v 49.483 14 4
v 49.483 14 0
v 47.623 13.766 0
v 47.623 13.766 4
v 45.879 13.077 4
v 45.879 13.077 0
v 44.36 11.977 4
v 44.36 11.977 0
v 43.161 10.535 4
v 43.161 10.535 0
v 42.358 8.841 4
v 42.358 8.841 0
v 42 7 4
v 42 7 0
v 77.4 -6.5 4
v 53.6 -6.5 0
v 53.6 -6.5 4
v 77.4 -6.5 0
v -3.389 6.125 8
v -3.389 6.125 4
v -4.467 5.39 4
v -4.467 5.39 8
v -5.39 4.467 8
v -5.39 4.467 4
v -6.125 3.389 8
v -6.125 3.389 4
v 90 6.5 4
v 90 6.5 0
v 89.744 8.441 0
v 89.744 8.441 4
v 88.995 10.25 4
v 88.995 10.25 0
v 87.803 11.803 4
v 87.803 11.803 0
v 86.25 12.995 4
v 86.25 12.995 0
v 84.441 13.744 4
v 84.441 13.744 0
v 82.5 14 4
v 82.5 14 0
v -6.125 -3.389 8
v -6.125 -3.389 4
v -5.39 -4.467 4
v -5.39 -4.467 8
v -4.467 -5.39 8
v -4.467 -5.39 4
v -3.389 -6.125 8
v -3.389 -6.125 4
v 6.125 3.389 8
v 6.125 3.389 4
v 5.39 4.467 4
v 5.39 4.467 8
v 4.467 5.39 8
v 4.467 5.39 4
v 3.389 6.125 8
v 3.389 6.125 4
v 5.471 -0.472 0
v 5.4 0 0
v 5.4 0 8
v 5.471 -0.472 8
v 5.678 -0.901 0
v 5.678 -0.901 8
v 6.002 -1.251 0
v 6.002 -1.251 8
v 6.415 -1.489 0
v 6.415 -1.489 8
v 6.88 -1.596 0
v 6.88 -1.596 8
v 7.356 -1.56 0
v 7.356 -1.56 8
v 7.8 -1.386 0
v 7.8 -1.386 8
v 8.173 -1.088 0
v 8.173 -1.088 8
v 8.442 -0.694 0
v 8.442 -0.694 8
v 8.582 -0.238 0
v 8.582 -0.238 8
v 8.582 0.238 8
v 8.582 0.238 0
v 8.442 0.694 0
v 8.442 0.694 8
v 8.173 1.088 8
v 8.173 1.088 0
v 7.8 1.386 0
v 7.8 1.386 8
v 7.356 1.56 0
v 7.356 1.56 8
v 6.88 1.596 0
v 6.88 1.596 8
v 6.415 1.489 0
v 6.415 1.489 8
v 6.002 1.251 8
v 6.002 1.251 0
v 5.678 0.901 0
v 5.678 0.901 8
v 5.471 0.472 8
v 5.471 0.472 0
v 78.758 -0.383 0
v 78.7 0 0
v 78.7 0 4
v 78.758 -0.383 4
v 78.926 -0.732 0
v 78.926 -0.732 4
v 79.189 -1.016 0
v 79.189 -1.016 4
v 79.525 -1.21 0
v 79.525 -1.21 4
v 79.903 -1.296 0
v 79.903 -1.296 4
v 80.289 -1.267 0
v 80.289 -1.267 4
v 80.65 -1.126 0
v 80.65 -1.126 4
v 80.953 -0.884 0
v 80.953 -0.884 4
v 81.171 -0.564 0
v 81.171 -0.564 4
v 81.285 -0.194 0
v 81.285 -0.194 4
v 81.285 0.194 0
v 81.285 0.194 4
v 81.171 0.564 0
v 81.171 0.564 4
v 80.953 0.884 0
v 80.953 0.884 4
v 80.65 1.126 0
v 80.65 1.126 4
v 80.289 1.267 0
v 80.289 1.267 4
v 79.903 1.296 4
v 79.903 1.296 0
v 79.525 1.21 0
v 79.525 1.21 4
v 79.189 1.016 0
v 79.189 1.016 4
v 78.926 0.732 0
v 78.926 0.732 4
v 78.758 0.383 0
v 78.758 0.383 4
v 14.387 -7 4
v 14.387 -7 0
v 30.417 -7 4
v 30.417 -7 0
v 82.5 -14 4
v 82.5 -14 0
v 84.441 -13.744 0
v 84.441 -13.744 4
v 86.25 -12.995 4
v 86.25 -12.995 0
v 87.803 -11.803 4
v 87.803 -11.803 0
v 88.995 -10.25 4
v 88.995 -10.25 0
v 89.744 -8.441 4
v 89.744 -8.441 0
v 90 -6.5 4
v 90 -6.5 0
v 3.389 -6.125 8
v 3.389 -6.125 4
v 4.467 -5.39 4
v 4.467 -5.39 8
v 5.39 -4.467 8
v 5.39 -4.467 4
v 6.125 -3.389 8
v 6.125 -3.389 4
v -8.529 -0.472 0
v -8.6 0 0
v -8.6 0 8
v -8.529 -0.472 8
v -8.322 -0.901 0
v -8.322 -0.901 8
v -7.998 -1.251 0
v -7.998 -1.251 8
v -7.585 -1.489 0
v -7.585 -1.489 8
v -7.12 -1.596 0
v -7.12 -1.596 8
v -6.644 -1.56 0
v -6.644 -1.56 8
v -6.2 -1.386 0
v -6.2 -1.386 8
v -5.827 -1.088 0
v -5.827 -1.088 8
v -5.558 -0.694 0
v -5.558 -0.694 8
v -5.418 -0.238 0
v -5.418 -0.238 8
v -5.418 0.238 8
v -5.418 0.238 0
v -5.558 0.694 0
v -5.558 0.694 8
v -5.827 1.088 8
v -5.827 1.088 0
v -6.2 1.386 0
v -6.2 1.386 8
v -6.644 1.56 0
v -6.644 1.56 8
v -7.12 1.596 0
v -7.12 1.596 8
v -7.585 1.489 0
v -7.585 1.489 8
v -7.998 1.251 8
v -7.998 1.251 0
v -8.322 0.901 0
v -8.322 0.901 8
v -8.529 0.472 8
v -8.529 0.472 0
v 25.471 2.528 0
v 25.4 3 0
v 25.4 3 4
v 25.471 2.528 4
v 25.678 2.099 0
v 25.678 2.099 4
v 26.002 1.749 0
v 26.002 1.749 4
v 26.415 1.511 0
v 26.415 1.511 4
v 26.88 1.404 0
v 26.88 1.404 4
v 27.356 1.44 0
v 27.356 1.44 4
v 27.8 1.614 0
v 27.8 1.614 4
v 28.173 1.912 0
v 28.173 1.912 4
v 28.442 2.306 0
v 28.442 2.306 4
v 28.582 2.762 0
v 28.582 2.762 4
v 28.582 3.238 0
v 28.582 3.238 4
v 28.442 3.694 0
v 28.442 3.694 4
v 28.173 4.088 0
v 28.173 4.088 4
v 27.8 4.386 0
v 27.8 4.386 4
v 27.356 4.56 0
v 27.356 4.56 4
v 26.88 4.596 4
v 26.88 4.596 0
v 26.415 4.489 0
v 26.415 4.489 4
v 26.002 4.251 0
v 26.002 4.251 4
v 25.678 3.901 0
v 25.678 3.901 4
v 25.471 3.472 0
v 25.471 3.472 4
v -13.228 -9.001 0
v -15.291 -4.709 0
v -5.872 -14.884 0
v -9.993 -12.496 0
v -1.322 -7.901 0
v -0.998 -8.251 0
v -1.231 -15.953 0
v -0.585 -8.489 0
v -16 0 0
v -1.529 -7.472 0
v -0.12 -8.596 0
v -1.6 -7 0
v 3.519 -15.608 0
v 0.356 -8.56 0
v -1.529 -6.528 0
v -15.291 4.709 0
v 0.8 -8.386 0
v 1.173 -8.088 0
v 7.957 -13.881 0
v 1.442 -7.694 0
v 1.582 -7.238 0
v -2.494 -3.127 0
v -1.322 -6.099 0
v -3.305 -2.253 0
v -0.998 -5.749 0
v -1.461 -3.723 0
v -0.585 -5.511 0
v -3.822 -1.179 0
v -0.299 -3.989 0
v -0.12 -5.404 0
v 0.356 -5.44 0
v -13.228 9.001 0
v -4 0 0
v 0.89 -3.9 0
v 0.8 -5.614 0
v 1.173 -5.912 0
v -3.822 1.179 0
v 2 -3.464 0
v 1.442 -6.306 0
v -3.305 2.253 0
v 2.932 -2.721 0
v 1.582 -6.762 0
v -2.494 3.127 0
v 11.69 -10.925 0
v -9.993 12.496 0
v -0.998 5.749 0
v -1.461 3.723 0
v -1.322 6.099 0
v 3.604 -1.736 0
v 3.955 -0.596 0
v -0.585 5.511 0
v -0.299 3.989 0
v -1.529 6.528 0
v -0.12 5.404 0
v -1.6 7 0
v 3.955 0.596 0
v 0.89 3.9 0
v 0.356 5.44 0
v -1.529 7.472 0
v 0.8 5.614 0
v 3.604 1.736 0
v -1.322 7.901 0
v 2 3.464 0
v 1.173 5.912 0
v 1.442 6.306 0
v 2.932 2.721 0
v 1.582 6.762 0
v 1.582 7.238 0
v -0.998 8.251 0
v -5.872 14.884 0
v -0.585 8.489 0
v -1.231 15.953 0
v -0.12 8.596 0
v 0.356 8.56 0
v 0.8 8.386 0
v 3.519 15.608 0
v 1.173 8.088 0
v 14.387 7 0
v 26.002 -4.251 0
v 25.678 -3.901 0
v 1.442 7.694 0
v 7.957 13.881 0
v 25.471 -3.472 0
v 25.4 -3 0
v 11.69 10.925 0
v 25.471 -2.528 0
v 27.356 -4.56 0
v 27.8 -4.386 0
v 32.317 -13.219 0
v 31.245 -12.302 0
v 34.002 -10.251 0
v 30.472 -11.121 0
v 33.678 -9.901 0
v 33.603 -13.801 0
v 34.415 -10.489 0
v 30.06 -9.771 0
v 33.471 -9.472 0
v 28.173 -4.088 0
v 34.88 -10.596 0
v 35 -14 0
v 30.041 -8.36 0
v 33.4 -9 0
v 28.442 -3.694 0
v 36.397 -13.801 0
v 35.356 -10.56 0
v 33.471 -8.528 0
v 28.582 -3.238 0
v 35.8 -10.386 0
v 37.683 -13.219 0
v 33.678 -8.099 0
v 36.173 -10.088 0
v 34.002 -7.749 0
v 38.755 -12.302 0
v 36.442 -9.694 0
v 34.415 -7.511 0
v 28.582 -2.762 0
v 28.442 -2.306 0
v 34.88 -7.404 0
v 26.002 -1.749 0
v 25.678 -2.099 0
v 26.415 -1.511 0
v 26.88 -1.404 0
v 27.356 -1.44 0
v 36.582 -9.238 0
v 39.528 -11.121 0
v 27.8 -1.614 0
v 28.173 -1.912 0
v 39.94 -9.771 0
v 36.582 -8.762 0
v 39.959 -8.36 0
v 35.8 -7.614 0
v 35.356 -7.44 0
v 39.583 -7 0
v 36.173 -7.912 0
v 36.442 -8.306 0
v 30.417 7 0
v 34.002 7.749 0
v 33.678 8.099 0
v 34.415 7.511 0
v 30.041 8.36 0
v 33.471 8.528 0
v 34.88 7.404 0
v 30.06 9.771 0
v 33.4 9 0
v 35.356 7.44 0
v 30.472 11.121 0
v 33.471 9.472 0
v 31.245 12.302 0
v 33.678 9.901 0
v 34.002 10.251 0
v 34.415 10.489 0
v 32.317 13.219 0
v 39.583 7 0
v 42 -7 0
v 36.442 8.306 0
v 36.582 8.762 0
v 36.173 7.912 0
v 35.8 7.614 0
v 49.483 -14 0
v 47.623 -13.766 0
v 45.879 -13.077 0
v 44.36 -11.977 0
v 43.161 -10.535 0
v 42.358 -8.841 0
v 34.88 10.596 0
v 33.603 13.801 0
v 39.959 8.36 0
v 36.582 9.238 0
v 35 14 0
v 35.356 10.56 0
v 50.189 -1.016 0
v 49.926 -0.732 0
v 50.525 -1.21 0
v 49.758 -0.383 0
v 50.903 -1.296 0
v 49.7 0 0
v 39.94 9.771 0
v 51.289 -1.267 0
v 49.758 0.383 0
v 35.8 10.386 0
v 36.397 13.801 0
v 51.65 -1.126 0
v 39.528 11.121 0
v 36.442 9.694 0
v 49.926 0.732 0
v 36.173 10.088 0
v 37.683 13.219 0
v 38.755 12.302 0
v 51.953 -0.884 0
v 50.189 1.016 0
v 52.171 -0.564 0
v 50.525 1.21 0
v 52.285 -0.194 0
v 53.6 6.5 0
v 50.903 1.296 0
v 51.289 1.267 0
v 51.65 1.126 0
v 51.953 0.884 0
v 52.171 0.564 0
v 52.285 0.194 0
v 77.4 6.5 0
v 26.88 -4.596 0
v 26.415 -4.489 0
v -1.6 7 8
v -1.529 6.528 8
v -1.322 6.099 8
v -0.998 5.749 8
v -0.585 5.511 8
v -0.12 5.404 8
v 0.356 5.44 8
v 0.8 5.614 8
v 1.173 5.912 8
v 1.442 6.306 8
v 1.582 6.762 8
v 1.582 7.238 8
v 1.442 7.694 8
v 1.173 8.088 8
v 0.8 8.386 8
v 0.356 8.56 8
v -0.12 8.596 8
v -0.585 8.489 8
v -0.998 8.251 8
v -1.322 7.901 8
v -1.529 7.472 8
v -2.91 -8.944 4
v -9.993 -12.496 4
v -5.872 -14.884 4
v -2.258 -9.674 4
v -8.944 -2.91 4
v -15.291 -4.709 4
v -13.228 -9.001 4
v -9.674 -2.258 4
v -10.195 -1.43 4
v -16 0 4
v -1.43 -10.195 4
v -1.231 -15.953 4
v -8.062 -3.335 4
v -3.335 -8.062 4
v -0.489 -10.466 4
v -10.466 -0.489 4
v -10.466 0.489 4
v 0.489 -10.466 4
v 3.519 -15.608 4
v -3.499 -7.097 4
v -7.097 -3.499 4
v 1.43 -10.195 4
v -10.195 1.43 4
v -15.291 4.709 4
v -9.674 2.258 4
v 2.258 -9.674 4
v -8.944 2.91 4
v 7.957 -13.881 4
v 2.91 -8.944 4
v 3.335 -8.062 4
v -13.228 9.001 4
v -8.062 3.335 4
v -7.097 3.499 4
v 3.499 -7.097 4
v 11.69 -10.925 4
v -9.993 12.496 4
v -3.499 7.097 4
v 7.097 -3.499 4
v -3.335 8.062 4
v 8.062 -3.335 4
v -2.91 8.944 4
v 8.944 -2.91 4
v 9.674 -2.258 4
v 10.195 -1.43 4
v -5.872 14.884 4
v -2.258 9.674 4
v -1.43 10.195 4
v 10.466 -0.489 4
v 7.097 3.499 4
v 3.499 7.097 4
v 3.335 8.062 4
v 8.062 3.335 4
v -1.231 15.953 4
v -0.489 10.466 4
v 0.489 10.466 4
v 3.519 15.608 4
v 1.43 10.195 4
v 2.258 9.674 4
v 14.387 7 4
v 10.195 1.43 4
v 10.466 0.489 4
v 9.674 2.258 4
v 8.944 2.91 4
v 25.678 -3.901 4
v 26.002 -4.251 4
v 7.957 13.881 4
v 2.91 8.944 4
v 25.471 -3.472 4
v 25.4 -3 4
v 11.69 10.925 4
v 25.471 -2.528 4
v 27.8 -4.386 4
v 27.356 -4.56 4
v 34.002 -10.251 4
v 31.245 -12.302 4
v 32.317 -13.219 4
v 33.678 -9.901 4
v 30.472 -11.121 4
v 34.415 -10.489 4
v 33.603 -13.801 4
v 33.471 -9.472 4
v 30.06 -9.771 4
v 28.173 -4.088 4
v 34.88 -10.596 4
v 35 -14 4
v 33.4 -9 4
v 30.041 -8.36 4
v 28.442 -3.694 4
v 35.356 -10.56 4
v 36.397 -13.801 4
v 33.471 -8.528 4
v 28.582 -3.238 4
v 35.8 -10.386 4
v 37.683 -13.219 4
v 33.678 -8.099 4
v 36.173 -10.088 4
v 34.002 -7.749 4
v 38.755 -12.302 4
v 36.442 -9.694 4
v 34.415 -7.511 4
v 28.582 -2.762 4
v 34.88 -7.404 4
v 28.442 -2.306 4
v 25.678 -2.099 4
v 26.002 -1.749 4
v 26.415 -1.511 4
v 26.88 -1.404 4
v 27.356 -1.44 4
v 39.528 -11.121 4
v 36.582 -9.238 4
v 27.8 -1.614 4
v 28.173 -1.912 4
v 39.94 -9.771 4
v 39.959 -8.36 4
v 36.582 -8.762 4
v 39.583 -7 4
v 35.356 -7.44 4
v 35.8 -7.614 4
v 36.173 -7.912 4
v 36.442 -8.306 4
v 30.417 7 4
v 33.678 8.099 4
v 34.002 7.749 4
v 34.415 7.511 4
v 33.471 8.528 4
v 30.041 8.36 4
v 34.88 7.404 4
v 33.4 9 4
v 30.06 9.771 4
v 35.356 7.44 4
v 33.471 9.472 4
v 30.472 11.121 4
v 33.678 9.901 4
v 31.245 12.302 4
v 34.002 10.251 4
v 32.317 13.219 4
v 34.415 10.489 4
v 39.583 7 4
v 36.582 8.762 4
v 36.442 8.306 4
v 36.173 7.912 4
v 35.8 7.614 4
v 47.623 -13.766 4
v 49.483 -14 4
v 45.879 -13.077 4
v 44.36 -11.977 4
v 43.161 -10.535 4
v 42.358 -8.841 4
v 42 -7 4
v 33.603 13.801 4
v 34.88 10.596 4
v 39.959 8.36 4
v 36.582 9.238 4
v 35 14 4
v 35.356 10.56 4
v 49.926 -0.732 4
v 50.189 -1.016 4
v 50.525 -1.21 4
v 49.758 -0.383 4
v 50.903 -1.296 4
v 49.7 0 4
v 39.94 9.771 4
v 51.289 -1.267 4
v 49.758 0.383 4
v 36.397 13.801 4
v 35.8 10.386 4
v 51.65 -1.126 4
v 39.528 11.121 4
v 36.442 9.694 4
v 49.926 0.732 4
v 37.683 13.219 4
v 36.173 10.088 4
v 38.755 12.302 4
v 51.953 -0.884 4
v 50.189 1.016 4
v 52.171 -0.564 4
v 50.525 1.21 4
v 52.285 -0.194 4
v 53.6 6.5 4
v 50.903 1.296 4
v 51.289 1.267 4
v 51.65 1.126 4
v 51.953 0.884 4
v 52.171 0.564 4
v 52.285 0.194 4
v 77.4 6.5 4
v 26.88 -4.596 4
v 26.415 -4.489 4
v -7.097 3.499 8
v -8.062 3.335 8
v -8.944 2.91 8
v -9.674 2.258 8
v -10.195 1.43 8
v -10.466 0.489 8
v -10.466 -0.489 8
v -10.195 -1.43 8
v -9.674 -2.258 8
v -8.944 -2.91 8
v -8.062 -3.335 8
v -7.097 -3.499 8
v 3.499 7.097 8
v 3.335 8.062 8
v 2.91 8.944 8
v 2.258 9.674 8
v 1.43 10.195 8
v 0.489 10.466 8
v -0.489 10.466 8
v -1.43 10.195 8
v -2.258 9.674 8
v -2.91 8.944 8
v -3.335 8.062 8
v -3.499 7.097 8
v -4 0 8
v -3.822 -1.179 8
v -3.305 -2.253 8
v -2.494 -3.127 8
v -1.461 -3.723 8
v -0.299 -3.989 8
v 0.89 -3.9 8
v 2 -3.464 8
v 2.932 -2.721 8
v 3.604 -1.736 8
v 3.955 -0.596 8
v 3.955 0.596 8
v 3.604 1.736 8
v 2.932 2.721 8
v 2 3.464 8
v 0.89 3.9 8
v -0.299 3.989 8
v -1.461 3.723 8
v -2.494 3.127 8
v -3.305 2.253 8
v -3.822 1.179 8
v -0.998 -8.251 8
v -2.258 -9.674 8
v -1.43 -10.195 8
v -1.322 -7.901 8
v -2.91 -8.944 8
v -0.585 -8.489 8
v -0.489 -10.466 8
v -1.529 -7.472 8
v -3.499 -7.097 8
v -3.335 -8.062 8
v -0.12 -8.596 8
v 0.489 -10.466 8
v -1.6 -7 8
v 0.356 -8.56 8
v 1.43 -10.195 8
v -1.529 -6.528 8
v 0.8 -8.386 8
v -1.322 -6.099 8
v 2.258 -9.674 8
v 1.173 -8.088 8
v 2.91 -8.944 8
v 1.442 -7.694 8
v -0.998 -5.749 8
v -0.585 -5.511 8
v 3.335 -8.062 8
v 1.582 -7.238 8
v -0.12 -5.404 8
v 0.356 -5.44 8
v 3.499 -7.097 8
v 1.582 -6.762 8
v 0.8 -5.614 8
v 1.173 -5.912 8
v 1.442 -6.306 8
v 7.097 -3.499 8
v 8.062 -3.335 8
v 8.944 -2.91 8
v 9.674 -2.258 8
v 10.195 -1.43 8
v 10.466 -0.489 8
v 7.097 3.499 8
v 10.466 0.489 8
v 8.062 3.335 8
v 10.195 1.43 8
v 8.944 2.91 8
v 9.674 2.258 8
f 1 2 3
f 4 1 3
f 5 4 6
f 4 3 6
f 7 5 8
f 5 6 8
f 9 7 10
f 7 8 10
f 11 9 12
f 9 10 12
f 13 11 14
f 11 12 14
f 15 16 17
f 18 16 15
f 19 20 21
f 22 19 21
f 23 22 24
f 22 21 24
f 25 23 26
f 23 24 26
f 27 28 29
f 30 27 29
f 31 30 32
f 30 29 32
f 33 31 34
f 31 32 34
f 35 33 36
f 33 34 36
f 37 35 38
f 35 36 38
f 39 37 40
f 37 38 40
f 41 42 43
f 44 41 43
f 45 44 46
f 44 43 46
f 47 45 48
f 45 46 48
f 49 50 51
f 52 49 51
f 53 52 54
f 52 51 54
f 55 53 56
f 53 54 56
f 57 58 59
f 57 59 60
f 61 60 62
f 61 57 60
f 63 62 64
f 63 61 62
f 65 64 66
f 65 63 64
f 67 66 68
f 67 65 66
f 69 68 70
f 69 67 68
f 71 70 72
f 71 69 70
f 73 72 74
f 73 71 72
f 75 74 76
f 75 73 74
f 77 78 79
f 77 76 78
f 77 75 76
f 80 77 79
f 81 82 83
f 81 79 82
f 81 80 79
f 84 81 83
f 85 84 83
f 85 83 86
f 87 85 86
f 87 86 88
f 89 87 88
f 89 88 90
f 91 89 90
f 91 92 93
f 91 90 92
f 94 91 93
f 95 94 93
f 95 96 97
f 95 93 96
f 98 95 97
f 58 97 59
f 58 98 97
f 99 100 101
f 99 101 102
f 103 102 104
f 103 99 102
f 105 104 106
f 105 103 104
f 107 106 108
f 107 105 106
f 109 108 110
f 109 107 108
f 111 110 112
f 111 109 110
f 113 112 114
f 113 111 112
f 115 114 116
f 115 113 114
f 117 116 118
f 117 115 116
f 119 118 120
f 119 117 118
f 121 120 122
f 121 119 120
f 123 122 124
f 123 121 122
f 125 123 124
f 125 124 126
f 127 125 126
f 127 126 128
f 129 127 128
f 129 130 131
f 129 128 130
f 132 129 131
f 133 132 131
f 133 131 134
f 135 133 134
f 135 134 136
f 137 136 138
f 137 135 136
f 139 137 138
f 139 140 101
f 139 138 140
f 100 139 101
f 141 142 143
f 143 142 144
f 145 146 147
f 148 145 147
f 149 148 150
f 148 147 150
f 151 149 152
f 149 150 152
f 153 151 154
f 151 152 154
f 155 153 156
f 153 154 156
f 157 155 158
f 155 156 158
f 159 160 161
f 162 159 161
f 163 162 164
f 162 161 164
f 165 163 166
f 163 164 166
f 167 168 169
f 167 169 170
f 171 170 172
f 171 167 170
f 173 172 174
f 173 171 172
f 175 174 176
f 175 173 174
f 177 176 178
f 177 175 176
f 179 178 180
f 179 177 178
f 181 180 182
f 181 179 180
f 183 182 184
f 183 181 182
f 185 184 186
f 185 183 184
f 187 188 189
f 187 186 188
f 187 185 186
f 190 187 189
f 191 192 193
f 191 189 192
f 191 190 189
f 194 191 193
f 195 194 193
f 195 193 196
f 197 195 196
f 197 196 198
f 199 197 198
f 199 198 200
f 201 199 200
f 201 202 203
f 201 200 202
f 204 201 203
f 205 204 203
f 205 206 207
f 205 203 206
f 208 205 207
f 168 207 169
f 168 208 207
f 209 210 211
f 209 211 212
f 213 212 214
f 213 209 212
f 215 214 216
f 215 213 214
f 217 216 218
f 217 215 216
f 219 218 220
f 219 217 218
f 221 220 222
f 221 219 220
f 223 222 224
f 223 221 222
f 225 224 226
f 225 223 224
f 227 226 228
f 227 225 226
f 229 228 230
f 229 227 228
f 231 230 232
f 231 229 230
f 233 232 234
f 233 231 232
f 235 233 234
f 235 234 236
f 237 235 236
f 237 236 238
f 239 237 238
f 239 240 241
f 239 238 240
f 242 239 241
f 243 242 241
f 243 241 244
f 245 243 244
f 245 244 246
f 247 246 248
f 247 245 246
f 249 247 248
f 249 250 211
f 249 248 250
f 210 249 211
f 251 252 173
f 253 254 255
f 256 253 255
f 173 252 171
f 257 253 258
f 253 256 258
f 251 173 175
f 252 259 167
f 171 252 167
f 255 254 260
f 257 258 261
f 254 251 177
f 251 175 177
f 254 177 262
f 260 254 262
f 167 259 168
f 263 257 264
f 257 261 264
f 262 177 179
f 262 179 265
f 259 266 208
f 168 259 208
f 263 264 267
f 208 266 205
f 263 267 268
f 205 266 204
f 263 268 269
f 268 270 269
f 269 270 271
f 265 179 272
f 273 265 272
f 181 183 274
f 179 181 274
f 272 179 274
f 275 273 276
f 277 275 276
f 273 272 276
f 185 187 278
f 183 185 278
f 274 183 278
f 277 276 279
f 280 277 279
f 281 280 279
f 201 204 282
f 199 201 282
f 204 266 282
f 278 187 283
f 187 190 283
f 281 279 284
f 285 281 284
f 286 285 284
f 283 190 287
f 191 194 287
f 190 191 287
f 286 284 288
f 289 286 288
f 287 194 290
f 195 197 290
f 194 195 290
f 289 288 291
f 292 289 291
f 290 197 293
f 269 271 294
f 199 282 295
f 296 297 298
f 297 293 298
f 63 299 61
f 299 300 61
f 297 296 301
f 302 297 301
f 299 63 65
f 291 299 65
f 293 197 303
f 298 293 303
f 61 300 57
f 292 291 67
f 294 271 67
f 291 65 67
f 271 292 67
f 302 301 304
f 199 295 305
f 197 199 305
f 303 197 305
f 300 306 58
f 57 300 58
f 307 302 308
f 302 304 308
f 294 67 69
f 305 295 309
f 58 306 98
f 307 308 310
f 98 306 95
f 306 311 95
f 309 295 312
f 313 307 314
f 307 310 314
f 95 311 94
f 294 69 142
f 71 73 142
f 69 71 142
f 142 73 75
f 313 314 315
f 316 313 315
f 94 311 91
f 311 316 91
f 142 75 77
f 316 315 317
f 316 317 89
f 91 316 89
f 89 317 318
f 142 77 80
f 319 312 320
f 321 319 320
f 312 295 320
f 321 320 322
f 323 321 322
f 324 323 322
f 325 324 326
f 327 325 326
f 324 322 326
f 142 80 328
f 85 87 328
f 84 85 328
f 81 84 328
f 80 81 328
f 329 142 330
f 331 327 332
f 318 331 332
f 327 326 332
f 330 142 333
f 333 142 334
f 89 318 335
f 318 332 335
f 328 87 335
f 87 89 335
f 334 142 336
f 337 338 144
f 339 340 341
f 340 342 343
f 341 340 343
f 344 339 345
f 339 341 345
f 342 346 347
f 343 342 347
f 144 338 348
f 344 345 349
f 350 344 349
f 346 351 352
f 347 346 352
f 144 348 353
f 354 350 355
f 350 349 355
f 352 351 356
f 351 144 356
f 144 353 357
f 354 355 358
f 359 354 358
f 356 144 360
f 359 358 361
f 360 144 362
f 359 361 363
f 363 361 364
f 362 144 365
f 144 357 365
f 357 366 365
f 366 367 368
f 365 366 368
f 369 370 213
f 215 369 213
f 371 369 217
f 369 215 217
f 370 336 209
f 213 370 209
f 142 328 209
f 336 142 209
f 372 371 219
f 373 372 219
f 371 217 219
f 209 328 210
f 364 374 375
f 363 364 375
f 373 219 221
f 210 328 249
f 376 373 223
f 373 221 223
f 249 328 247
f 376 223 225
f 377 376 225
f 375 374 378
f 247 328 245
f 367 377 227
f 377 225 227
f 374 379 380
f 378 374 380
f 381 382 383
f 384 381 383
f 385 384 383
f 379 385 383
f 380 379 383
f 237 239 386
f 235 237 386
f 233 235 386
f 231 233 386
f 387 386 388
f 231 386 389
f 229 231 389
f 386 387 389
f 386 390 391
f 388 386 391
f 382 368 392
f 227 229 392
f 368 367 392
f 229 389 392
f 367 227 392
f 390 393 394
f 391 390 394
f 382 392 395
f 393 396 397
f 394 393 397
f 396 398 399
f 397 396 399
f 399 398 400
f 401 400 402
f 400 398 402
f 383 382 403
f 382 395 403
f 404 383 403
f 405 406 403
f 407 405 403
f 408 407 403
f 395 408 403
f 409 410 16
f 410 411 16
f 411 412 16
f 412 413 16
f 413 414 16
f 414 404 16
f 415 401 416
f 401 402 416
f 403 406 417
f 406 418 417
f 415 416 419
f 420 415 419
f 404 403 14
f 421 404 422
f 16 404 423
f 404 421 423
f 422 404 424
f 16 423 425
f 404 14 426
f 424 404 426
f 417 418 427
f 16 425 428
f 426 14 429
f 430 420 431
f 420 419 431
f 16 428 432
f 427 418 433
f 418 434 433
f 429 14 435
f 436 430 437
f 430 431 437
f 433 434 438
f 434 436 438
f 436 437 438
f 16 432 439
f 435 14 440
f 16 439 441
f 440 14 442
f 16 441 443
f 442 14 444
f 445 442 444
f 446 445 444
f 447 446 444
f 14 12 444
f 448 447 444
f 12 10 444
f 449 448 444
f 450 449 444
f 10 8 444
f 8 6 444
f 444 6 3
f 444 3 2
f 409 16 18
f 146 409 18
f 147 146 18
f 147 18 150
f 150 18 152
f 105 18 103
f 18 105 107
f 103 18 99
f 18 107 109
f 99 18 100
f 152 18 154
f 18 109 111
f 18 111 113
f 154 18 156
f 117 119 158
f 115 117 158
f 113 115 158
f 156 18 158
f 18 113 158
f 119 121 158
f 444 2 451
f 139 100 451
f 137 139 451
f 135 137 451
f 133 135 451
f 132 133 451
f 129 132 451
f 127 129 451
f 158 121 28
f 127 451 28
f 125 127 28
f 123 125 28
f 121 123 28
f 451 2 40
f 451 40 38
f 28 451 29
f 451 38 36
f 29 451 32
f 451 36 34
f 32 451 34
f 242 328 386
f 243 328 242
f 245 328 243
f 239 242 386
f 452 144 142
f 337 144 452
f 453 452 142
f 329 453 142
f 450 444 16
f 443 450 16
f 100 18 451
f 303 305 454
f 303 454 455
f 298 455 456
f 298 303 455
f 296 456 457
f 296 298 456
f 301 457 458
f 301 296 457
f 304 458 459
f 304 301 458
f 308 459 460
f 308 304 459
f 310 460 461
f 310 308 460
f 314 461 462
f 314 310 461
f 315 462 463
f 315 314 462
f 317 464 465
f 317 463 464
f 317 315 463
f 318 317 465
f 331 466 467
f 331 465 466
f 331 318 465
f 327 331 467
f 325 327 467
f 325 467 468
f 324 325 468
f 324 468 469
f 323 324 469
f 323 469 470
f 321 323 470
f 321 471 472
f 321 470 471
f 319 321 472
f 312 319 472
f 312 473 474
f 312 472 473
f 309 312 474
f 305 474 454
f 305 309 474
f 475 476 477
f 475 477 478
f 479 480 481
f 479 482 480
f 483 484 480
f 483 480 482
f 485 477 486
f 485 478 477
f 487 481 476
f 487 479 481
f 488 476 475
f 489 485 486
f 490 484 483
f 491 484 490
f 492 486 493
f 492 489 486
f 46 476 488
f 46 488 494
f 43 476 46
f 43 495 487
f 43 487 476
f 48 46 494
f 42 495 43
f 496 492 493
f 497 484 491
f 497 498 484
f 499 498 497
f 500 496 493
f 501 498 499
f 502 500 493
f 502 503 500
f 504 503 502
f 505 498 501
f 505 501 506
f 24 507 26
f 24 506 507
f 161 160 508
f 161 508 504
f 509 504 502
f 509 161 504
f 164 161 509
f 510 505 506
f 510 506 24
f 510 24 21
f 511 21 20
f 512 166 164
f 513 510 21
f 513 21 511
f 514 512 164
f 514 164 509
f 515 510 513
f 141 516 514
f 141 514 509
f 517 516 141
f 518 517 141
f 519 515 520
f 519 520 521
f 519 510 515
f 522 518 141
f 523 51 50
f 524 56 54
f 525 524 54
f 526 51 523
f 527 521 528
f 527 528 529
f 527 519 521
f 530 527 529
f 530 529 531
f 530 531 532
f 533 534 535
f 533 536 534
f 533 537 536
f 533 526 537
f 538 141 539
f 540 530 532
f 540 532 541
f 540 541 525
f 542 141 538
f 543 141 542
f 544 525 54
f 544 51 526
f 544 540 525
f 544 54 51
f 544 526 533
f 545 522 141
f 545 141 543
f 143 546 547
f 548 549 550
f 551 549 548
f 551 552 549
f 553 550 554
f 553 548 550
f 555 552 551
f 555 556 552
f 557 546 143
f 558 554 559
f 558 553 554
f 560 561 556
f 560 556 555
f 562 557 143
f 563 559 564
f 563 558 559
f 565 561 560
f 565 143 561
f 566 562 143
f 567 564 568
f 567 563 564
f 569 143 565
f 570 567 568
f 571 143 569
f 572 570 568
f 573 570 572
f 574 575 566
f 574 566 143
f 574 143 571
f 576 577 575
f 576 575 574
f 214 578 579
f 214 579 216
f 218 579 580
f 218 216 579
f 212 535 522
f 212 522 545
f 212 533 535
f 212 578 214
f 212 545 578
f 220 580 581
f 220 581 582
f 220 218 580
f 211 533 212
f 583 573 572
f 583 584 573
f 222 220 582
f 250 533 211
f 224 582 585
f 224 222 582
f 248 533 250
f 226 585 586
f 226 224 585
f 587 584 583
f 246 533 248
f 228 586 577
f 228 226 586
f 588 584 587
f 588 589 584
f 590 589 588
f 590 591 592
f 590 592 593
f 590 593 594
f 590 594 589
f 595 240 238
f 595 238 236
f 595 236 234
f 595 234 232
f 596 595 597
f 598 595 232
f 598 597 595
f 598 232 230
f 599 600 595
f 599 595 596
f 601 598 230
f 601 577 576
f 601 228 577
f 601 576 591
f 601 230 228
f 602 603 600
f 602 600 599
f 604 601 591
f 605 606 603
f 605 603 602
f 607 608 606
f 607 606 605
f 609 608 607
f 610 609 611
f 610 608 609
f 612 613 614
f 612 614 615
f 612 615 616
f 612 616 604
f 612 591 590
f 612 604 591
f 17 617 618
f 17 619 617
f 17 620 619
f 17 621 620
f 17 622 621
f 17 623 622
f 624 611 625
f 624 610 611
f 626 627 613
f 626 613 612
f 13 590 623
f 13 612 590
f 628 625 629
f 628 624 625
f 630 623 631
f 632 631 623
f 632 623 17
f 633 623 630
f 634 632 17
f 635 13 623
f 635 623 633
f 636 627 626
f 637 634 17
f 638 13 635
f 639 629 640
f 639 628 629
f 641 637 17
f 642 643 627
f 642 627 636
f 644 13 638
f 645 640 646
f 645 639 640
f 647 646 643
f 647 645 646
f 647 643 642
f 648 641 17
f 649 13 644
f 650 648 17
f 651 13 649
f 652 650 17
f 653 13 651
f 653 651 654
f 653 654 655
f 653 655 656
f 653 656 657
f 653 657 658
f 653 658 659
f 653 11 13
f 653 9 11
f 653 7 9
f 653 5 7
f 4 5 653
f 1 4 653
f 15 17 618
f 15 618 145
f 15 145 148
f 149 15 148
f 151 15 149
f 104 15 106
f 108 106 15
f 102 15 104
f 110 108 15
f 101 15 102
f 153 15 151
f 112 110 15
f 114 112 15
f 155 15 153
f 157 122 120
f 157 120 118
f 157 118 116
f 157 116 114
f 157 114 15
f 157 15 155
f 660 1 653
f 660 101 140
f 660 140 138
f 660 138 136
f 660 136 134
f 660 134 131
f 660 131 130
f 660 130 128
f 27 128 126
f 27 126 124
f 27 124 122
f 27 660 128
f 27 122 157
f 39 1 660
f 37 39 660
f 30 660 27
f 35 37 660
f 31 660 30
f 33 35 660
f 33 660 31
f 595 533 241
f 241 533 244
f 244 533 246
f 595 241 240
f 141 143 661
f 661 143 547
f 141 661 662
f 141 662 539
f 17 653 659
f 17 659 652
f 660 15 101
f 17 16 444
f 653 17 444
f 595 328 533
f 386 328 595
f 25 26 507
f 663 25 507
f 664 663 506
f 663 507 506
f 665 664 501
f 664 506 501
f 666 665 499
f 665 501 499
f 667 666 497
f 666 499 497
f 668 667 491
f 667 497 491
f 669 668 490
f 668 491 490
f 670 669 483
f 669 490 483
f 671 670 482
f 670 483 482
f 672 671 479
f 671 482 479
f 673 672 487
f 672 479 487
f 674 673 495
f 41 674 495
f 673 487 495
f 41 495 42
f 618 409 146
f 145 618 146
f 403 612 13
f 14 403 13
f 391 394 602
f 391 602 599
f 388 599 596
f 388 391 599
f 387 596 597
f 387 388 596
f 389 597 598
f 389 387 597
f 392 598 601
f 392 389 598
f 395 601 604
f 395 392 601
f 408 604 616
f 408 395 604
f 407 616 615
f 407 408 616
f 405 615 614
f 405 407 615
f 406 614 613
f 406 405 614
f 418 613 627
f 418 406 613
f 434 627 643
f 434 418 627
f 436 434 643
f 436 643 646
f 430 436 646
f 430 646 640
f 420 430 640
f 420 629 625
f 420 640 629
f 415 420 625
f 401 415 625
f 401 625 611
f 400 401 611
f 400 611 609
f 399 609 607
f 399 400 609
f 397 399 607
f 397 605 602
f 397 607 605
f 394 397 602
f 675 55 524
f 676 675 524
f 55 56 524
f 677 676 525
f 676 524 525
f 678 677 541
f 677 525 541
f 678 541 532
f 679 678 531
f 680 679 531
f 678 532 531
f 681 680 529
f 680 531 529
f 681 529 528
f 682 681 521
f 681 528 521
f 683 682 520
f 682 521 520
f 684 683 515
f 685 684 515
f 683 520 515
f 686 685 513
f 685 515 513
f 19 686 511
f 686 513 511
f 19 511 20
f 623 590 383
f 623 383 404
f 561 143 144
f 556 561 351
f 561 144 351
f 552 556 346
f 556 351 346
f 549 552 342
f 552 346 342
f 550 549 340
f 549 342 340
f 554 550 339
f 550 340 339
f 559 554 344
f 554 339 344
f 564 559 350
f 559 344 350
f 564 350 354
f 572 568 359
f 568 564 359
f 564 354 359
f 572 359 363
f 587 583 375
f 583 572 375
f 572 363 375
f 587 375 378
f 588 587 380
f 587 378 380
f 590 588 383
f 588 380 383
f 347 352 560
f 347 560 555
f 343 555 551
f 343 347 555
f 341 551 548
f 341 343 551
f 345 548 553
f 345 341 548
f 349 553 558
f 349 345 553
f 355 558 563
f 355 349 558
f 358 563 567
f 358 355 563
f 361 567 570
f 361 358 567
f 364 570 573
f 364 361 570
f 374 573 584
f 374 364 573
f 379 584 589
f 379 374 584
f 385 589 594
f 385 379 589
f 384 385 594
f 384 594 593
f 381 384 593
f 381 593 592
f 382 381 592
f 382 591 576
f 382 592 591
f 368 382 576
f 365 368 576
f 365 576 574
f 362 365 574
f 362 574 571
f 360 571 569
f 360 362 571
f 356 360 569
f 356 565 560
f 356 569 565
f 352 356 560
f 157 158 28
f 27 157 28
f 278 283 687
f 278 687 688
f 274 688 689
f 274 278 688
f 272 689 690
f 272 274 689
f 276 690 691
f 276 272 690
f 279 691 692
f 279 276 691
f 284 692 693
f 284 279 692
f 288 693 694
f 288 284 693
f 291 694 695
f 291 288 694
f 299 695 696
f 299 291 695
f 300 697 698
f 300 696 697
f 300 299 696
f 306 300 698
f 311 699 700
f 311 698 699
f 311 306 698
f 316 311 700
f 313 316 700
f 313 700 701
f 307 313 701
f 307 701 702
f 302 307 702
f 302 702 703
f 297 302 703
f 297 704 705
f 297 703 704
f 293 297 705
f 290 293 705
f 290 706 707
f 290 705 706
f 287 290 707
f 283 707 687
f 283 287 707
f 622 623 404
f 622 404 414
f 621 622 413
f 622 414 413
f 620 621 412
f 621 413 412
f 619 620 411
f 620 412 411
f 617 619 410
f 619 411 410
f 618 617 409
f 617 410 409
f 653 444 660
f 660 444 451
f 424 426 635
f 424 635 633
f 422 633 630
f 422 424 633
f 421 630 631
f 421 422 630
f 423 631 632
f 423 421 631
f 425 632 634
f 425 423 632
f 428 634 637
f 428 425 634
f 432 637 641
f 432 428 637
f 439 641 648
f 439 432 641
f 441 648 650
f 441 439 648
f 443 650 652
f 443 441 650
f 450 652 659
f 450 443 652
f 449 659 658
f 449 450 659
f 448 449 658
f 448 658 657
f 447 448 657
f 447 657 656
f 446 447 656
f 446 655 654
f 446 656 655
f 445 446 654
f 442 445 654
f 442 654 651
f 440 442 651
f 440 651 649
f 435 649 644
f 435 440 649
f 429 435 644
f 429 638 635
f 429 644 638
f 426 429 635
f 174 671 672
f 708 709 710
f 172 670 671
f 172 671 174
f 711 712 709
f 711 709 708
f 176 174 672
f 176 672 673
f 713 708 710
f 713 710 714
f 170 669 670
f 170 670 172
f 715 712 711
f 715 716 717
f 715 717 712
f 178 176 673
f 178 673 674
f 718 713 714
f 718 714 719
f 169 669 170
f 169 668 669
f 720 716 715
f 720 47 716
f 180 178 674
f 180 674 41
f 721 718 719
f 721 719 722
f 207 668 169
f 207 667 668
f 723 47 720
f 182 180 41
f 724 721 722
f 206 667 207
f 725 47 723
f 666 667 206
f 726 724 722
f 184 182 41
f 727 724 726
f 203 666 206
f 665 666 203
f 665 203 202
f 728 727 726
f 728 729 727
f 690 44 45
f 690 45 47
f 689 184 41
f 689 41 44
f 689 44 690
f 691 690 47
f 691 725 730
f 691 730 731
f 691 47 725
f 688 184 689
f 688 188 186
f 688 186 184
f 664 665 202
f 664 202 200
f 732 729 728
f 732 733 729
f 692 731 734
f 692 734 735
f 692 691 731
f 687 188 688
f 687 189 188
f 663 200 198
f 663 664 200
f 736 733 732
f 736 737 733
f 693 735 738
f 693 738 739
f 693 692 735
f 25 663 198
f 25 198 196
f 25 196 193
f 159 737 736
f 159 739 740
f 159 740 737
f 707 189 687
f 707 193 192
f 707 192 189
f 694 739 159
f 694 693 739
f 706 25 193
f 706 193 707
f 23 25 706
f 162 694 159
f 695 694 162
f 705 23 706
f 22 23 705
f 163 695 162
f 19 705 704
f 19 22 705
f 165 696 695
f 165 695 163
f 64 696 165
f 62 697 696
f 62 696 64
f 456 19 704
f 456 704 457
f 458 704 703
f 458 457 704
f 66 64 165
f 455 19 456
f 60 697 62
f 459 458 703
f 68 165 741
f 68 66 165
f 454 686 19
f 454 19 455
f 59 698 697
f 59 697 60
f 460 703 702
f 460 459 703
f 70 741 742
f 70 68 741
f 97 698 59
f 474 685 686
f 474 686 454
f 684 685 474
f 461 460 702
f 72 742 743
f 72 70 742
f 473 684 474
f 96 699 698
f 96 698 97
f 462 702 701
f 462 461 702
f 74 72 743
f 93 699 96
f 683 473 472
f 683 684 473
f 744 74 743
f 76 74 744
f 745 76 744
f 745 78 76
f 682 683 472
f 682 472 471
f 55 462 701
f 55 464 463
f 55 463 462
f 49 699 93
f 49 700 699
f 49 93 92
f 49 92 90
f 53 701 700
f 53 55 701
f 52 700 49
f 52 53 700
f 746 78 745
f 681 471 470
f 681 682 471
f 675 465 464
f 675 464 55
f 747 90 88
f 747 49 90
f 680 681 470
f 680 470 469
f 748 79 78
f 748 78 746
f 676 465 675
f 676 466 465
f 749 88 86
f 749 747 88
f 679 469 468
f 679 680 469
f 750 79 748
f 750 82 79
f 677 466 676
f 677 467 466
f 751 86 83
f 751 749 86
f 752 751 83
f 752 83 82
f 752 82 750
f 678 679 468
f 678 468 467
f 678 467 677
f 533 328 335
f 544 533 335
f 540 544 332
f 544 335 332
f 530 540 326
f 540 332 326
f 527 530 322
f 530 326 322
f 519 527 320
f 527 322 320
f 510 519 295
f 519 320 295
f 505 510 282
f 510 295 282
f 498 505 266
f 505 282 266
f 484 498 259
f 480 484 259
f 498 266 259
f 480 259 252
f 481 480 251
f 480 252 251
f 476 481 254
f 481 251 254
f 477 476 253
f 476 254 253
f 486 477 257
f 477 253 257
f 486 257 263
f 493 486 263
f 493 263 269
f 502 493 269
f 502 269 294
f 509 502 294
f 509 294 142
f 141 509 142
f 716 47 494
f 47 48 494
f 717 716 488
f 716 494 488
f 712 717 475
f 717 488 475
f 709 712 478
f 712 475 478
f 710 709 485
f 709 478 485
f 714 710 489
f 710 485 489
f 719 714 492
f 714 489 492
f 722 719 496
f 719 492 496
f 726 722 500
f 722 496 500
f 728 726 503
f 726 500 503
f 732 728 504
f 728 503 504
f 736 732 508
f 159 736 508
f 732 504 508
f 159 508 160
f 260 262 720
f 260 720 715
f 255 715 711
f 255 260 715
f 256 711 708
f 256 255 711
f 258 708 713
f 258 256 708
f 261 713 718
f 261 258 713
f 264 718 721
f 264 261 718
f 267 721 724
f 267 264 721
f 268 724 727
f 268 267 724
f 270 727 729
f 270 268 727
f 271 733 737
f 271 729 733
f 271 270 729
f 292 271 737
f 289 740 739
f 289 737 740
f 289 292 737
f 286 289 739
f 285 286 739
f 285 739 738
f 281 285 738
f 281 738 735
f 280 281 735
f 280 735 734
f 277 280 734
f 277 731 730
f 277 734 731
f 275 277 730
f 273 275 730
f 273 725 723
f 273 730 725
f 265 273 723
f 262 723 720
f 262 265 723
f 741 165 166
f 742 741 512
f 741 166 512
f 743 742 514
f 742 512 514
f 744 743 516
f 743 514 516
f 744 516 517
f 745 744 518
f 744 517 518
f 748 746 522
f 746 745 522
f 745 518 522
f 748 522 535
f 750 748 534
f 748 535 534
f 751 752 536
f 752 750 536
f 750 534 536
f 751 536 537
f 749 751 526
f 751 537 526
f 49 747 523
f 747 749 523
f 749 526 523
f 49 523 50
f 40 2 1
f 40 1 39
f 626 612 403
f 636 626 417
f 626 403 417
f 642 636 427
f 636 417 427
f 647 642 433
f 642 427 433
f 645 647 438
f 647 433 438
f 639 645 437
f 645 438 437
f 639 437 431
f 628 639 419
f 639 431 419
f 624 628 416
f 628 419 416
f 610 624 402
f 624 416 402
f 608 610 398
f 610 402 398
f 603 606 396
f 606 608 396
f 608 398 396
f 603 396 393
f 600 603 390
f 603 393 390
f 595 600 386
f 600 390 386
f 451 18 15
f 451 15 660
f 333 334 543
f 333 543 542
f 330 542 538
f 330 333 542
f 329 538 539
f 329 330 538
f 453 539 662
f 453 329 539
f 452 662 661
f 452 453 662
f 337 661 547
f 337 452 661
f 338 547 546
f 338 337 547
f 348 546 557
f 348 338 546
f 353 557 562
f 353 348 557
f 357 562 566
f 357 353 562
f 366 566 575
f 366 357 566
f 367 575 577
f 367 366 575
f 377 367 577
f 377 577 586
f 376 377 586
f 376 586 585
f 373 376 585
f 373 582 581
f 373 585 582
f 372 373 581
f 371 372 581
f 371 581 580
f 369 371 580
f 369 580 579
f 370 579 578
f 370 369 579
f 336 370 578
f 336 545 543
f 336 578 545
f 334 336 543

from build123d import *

# Parameters (mm, degrees)
MAIN_WEB_PROFILE_W                      = 60
MAIN_WEB_PROFILE_H                      = 14
MAIN_WEB_DEPTH                          = 4
SHOULDER_HORN_FLANGE_PROFILE_R          = 16
SHOULDER_HORN_FLANGE_DEPTH              = 4
ELBOW_SERVO_MOUNT_PROFILE_W             = 48
ELBOW_SERVO_MOUNT_PROFILE_H             = 28
ELBOW_SERVO_MOUNT_DEPTH                 = 4
SG90_BODY_CLEARANCE_START               = -5
SG90_BODY_CLEARANCE_PROFILE_W           = 23.8
SG90_BODY_CLEARANCE_PROFILE_H           = 13
SG90_BODY_CLEARANCE_DEPTH               = 97.49863387
ELBOW_TAB_FASTENERS_START               = -50
ELBOW_TAB_FASTENERS_PROFILE_R           = 1.3
ELBOW_TAB_FASTENERS_DEPTH               = 142.49863387
SHOULDER_CENTER_SCREW_ACCESS_START      = -50
SHOULDER_CENTER_SCREW_ACCESS_PROFILE_R  = 4
SHOULDER_CENTER_SCREW_ACCESS_DEPTH      = 142.49863387
CABLE_TIE_HOLES_START                   = -50
CABLE_TIE_HOLES_PROFILE_R               = 1.6
CABLE_TIE_HOLES_DEPTH                   = 142.49863387
PASSIVE_LOWER_MOUNT_BOSS_PROFILE_R      = 5
PASSIVE_LOWER_MOUNT_BOSS_DEPTH          = 4
PASSIVE_UPPER_MOUNT_BOSS_PROFILE_R      = 5
PASSIVE_UPPER_MOUNT_BOSS_DEPTH          = 4
PASSIVE_CHEEK_STANDOFFS_START           = -50
PASSIVE_CHEEK_STANDOFFS_PROFILE_R       = 1.6
PASSIVE_CHEEK_STANDOFFS_DEPTH           = 142.49863387
SHOULDER_DOWEL_SUPPORT_HUB_START        = 4
SHOULDER_DOWEL_SUPPORT_HUB_PROFILE_R    = 7
SHOULDER_DOWEL_SUPPORT_HUB_PROFILE_R_2  = 4
SHOULDER_DOWEL_SUPPORT_HUB_DEPTH        = 4
RAISED_M3_WASHER_SEATS_HEIGHT8_START    = 4
RAISED_M3_WASHER_SEATS_PCD14_PROFILE_R  = 3.5
RAISED_M3_WASHER_SEATS_HEIGHT8_DEPTH    = 4
METAL_HORN_M3_CLEARANCE_PCD14_START     = -50
METAL_HORN_M3_CLEARANCE_PCD14_PROFILE_R = 1.6
METAL_HORN_M3_CLEARANCE_PCD14_DEPTH     = 142.760557976
RESTORE_SHOULDER_SLEEVE_BORE_START      = -50
RESTORE_SHOULDER_SLEEVE_BORE_PROFILE_R  = 4
RESTORE_SHOULDER_SLEEVE_BORE_DEPTH      = 142.760557976
FILLET1_R                               = 7.5


with BuildPart() as part:
    # Main_web_profile → Main_web (new body)
    with BuildSketch(Plane.XY):
        with Locations((30, 0)):
            Rectangle(MAIN_WEB_PROFILE_W, MAIN_WEB_PROFILE_H)
    extrude(amount=MAIN_WEB_DEPTH)

    # Shoulder_horn_flange_profile → Shoulder_horn_flange (add)
    with BuildSketch(Plane.XY):
        Circle(SHOULDER_HORN_FLANGE_PROFILE_R)
    extrude(amount=SHOULDER_HORN_FLANGE_DEPTH)

    # Elbow_servo_mount_profile → Elbow_servo_mount (add)
    with BuildSketch(Plane.XY):
        with Locations((66, 0)):
            Rectangle(ELBOW_SERVO_MOUNT_PROFILE_W, ELBOW_SERVO_MOUNT_PROFILE_H)
    extrude(amount=ELBOW_SERVO_MOUNT_DEPTH)

    # SG90_body_clearance_profile → SG90_body_clearance (cut, through all)
    with BuildSketch(Plane.XY.offset(SG90_BODY_CLEARANCE_START)):
        with Locations((65.5, 0)):
            Rectangle(SG90_BODY_CLEARANCE_PROFILE_W, SG90_BODY_CLEARANCE_PROFILE_H)
    extrude(amount=SG90_BODY_CLEARANCE_DEPTH, mode=Mode.SUBTRACT)

    # Elbow_tab_fasteners_profile → Elbow_tab_fasteners (cut, through all)
    with BuildSketch(Plane.XY.offset(ELBOW_TAB_FASTENERS_START)):
        with Locations(Location((51, 0, 0), (0, 0, 180))):
            Circle(ELBOW_TAB_FASTENERS_PROFILE_R)
        with Locations(Location((80, 0, 0), (0, 0, 180))):
            Circle(ELBOW_TAB_FASTENERS_PROFILE_R)
    extrude(amount=ELBOW_TAB_FASTENERS_DEPTH, mode=Mode.SUBTRACT)

    # Shoulder_center_screw_access_profile → Shoulder_center_screw_access (cut, through all)
    with BuildSketch(Plane.XY.offset(SHOULDER_CENTER_SCREW_ACCESS_START)):
        with Locations(Location((0, 0, 0), (0, 0, 180))):
            Circle(SHOULDER_CENTER_SCREW_ACCESS_PROFILE_R)
    extrude(amount=SHOULDER_CENTER_SCREW_ACCESS_DEPTH, mode=Mode.SUBTRACT)

    # Cable_tie_holes_profile → Cable_tie_holes (cut, through all)
    with BuildSketch(Plane.XY.offset(CABLE_TIE_HOLES_START)):
        with Locations(Location((27, -3, 0), (0, 0, 180))):
            Circle(CABLE_TIE_HOLES_PROFILE_R)
        with Locations(Location((27, 3, 0), (0, 0, 180))):
            Circle(CABLE_TIE_HOLES_PROFILE_R)
    extrude(amount=CABLE_TIE_HOLES_DEPTH, mode=Mode.SUBTRACT)

    # Passive_lower_mount_boss_profile → Passive_lower_mount_boss (add)
    with BuildSketch(Plane.XY):
        with Locations((35, -9)):
            Circle(PASSIVE_LOWER_MOUNT_BOSS_PROFILE_R)
    extrude(amount=PASSIVE_LOWER_MOUNT_BOSS_DEPTH)

    # Passive_upper_mount_boss_profile → Passive_upper_mount_boss (add)
    with BuildSketch(Plane.XY):
        with Locations((35, 9)):
            Circle(PASSIVE_UPPER_MOUNT_BOSS_PROFILE_R)
    extrude(amount=PASSIVE_UPPER_MOUNT_BOSS_DEPTH)

    # Passive_cheek_standoffs_profile → Passive_cheek_standoffs (cut, through all)
    with BuildSketch(Plane.XY.offset(PASSIVE_CHEEK_STANDOFFS_START)):
        with Locations(Location((35, -9, 0), (0, 0, 180))):
            Circle(PASSIVE_CHEEK_STANDOFFS_PROFILE_R)
        with Locations(Location((35, 9, 0), (0, 0, 180))):
            Circle(PASSIVE_CHEEK_STANDOFFS_PROFILE_R)
    extrude(amount=PASSIVE_CHEEK_STANDOFFS_DEPTH, mode=Mode.SUBTRACT)

    # Shoulder_dowel_support_hub_profile → Shoulder_dowel_support_hub (add)
    with BuildSketch(Plane.XY.offset(SHOULDER_DOWEL_SUPPORT_HUB_START)):
        Circle(SHOULDER_DOWEL_SUPPORT_HUB_PROFILE_R)
        with Locations(Location((0, 0, 0), (0, 0, 180))):
            Circle(SHOULDER_DOWEL_SUPPORT_HUB_PROFILE_R_2, mode=Mode.SUBTRACT)
    extrude(amount=SHOULDER_DOWEL_SUPPORT_HUB_DEPTH)

    # Raised_M3_washer_seats_PCD14_profile → Raised_M3_washer_seats_height8 (add)
    with BuildSketch(Plane.XY.offset(RAISED_M3_WASHER_SEATS_HEIGHT8_START)):
        with Locations((7, 0)):
            Circle(RAISED_M3_WASHER_SEATS_PCD14_PROFILE_R)
        with Locations((-7, 0)):
            Circle(RAISED_M3_WASHER_SEATS_PCD14_PROFILE_R)
        with Locations((0, 7)):
            Circle(RAISED_M3_WASHER_SEATS_PCD14_PROFILE_R)
        with Locations((0, -7)):
            Circle(RAISED_M3_WASHER_SEATS_PCD14_PROFILE_R)
    extrude(amount=RAISED_M3_WASHER_SEATS_HEIGHT8_DEPTH)

    # Metal_horn_M3_clearance_PCD14_profile → Metal_horn_M3_clearance_PCD14 (cut, through all)
    with BuildSketch(Plane.XY.offset(METAL_HORN_M3_CLEARANCE_PCD14_START)):
        with Locations(Location((7, 0, 0), (0, 0, 180))):
            Circle(METAL_HORN_M3_CLEARANCE_PCD14_PROFILE_R)
        with Locations(Location((-7, 0, 0), (0, 0, 180))):
            Circle(METAL_HORN_M3_CLEARANCE_PCD14_PROFILE_R)
        with Locations(Location((0, 7, 0), (0, 0, 180))):
            Circle(METAL_HORN_M3_CLEARANCE_PCD14_PROFILE_R)
        with Locations(Location((0, -7, 0), (0, 0, 180))):
            Circle(METAL_HORN_M3_CLEARANCE_PCD14_PROFILE_R)
    extrude(amount=METAL_HORN_M3_CLEARANCE_PCD14_DEPTH, mode=Mode.SUBTRACT)

    # Restore_shoulder_sleeve_bore_profile → Restore_shoulder_sleeve_bore (cut, through all)
    with BuildSketch(Plane.XY.offset(RESTORE_SHOULDER_SLEEVE_BORE_START)):
        with Locations(Location((0, 0, 0), (0, 0, 180))):
            Circle(RESTORE_SHOULDER_SLEEVE_BORE_PROFILE_R)
    extrude(amount=RESTORE_SHOULDER_SLEEVE_BORE_DEPTH, mode=Mode.SUBTRACT)

    # Fillet1
    # the kernel refuses this fillet: 7.5 mm, written as the material it takes off along each edge
    with BuildSketch(Plane(origin=(42, -14, -18.708286934), x_dir=(0, 1, 0), z_dir=(0, 0, 1))) as fillet1_piece_1:
        with BuildLine():
            CenterArc((7.5, -7.483314774), FILLET1_R, 93.822553729, 86.177446271)
            Line((0, -7.483314774), (-0.15, -7.483314774))
            Line((-0.15, -7.483314774), (-0.15, 0))
            Line((-0.15, 0), (0, 0.15))
            ThreePointArc((0, 0.15), (3.5, 0.15), (6.99, 0.149666295))
            Line((6.99, 0.149666295), (7, 0))
        make_face()
    extrude(amount=41.416573868, mode=Mode.SUBTRACT)
    with BuildSketch(Plane(origin=(90, -14, -18.75), x_dir=(-1, 0, 0), z_dir=(0, 0, 1)), Plane(origin=(90, 14, -18.75), x_dir=(0, -1, 0), z_dir=(0, 0, 1))) as fillet1_piece_2:
        with BuildLine():
            CenterArc((FILLET1_R, -FILLET1_R), FILLET1_R, 90, 90)
            Line((0, -FILLET1_R), (-FILLET1_R * 0.02, -FILLET1_R))
            Line((-FILLET1_R * 0.02, -FILLET1_R), (-FILLET1_R * 0.02, FILLET1_R * 0.02))
            Line((-FILLET1_R * 0.02, FILLET1_R * 0.02), (FILLET1_R, FILLET1_R * 0.02))
            Line((FILLET1_R, FILLET1_R * 0.02), (FILLET1_R, 0))
        make_face()
    extrude(amount=41.5, mode=Mode.SUBTRACT)
    with BuildSketch(Plane(origin=(42, 14, -18.708286934), x_dir=(0, -1, 0), z_dir=(0, 0, 1))) as fillet1_piece_3:
        with BuildLine():
            CenterArc((7.5, 7.483314774), FILLET1_R, 180, 86.177446271)
            Line((0, 7.483314774), (-0.15, 7.483314774))
            Line((-0.15, 7.483314774), (-0.15, 0))
            Line((-0.15, 0), (0, -0.15))
            ThreePointArc((0, -0.15), (3.5, -0.15), (6.99, -0.149666295))
            Line((6.99, -0.149666295), (7, 0))
        make_face()
    extrude(amount=41.416573868, mode=Mode.SUBTRACT)


solid = part.part
